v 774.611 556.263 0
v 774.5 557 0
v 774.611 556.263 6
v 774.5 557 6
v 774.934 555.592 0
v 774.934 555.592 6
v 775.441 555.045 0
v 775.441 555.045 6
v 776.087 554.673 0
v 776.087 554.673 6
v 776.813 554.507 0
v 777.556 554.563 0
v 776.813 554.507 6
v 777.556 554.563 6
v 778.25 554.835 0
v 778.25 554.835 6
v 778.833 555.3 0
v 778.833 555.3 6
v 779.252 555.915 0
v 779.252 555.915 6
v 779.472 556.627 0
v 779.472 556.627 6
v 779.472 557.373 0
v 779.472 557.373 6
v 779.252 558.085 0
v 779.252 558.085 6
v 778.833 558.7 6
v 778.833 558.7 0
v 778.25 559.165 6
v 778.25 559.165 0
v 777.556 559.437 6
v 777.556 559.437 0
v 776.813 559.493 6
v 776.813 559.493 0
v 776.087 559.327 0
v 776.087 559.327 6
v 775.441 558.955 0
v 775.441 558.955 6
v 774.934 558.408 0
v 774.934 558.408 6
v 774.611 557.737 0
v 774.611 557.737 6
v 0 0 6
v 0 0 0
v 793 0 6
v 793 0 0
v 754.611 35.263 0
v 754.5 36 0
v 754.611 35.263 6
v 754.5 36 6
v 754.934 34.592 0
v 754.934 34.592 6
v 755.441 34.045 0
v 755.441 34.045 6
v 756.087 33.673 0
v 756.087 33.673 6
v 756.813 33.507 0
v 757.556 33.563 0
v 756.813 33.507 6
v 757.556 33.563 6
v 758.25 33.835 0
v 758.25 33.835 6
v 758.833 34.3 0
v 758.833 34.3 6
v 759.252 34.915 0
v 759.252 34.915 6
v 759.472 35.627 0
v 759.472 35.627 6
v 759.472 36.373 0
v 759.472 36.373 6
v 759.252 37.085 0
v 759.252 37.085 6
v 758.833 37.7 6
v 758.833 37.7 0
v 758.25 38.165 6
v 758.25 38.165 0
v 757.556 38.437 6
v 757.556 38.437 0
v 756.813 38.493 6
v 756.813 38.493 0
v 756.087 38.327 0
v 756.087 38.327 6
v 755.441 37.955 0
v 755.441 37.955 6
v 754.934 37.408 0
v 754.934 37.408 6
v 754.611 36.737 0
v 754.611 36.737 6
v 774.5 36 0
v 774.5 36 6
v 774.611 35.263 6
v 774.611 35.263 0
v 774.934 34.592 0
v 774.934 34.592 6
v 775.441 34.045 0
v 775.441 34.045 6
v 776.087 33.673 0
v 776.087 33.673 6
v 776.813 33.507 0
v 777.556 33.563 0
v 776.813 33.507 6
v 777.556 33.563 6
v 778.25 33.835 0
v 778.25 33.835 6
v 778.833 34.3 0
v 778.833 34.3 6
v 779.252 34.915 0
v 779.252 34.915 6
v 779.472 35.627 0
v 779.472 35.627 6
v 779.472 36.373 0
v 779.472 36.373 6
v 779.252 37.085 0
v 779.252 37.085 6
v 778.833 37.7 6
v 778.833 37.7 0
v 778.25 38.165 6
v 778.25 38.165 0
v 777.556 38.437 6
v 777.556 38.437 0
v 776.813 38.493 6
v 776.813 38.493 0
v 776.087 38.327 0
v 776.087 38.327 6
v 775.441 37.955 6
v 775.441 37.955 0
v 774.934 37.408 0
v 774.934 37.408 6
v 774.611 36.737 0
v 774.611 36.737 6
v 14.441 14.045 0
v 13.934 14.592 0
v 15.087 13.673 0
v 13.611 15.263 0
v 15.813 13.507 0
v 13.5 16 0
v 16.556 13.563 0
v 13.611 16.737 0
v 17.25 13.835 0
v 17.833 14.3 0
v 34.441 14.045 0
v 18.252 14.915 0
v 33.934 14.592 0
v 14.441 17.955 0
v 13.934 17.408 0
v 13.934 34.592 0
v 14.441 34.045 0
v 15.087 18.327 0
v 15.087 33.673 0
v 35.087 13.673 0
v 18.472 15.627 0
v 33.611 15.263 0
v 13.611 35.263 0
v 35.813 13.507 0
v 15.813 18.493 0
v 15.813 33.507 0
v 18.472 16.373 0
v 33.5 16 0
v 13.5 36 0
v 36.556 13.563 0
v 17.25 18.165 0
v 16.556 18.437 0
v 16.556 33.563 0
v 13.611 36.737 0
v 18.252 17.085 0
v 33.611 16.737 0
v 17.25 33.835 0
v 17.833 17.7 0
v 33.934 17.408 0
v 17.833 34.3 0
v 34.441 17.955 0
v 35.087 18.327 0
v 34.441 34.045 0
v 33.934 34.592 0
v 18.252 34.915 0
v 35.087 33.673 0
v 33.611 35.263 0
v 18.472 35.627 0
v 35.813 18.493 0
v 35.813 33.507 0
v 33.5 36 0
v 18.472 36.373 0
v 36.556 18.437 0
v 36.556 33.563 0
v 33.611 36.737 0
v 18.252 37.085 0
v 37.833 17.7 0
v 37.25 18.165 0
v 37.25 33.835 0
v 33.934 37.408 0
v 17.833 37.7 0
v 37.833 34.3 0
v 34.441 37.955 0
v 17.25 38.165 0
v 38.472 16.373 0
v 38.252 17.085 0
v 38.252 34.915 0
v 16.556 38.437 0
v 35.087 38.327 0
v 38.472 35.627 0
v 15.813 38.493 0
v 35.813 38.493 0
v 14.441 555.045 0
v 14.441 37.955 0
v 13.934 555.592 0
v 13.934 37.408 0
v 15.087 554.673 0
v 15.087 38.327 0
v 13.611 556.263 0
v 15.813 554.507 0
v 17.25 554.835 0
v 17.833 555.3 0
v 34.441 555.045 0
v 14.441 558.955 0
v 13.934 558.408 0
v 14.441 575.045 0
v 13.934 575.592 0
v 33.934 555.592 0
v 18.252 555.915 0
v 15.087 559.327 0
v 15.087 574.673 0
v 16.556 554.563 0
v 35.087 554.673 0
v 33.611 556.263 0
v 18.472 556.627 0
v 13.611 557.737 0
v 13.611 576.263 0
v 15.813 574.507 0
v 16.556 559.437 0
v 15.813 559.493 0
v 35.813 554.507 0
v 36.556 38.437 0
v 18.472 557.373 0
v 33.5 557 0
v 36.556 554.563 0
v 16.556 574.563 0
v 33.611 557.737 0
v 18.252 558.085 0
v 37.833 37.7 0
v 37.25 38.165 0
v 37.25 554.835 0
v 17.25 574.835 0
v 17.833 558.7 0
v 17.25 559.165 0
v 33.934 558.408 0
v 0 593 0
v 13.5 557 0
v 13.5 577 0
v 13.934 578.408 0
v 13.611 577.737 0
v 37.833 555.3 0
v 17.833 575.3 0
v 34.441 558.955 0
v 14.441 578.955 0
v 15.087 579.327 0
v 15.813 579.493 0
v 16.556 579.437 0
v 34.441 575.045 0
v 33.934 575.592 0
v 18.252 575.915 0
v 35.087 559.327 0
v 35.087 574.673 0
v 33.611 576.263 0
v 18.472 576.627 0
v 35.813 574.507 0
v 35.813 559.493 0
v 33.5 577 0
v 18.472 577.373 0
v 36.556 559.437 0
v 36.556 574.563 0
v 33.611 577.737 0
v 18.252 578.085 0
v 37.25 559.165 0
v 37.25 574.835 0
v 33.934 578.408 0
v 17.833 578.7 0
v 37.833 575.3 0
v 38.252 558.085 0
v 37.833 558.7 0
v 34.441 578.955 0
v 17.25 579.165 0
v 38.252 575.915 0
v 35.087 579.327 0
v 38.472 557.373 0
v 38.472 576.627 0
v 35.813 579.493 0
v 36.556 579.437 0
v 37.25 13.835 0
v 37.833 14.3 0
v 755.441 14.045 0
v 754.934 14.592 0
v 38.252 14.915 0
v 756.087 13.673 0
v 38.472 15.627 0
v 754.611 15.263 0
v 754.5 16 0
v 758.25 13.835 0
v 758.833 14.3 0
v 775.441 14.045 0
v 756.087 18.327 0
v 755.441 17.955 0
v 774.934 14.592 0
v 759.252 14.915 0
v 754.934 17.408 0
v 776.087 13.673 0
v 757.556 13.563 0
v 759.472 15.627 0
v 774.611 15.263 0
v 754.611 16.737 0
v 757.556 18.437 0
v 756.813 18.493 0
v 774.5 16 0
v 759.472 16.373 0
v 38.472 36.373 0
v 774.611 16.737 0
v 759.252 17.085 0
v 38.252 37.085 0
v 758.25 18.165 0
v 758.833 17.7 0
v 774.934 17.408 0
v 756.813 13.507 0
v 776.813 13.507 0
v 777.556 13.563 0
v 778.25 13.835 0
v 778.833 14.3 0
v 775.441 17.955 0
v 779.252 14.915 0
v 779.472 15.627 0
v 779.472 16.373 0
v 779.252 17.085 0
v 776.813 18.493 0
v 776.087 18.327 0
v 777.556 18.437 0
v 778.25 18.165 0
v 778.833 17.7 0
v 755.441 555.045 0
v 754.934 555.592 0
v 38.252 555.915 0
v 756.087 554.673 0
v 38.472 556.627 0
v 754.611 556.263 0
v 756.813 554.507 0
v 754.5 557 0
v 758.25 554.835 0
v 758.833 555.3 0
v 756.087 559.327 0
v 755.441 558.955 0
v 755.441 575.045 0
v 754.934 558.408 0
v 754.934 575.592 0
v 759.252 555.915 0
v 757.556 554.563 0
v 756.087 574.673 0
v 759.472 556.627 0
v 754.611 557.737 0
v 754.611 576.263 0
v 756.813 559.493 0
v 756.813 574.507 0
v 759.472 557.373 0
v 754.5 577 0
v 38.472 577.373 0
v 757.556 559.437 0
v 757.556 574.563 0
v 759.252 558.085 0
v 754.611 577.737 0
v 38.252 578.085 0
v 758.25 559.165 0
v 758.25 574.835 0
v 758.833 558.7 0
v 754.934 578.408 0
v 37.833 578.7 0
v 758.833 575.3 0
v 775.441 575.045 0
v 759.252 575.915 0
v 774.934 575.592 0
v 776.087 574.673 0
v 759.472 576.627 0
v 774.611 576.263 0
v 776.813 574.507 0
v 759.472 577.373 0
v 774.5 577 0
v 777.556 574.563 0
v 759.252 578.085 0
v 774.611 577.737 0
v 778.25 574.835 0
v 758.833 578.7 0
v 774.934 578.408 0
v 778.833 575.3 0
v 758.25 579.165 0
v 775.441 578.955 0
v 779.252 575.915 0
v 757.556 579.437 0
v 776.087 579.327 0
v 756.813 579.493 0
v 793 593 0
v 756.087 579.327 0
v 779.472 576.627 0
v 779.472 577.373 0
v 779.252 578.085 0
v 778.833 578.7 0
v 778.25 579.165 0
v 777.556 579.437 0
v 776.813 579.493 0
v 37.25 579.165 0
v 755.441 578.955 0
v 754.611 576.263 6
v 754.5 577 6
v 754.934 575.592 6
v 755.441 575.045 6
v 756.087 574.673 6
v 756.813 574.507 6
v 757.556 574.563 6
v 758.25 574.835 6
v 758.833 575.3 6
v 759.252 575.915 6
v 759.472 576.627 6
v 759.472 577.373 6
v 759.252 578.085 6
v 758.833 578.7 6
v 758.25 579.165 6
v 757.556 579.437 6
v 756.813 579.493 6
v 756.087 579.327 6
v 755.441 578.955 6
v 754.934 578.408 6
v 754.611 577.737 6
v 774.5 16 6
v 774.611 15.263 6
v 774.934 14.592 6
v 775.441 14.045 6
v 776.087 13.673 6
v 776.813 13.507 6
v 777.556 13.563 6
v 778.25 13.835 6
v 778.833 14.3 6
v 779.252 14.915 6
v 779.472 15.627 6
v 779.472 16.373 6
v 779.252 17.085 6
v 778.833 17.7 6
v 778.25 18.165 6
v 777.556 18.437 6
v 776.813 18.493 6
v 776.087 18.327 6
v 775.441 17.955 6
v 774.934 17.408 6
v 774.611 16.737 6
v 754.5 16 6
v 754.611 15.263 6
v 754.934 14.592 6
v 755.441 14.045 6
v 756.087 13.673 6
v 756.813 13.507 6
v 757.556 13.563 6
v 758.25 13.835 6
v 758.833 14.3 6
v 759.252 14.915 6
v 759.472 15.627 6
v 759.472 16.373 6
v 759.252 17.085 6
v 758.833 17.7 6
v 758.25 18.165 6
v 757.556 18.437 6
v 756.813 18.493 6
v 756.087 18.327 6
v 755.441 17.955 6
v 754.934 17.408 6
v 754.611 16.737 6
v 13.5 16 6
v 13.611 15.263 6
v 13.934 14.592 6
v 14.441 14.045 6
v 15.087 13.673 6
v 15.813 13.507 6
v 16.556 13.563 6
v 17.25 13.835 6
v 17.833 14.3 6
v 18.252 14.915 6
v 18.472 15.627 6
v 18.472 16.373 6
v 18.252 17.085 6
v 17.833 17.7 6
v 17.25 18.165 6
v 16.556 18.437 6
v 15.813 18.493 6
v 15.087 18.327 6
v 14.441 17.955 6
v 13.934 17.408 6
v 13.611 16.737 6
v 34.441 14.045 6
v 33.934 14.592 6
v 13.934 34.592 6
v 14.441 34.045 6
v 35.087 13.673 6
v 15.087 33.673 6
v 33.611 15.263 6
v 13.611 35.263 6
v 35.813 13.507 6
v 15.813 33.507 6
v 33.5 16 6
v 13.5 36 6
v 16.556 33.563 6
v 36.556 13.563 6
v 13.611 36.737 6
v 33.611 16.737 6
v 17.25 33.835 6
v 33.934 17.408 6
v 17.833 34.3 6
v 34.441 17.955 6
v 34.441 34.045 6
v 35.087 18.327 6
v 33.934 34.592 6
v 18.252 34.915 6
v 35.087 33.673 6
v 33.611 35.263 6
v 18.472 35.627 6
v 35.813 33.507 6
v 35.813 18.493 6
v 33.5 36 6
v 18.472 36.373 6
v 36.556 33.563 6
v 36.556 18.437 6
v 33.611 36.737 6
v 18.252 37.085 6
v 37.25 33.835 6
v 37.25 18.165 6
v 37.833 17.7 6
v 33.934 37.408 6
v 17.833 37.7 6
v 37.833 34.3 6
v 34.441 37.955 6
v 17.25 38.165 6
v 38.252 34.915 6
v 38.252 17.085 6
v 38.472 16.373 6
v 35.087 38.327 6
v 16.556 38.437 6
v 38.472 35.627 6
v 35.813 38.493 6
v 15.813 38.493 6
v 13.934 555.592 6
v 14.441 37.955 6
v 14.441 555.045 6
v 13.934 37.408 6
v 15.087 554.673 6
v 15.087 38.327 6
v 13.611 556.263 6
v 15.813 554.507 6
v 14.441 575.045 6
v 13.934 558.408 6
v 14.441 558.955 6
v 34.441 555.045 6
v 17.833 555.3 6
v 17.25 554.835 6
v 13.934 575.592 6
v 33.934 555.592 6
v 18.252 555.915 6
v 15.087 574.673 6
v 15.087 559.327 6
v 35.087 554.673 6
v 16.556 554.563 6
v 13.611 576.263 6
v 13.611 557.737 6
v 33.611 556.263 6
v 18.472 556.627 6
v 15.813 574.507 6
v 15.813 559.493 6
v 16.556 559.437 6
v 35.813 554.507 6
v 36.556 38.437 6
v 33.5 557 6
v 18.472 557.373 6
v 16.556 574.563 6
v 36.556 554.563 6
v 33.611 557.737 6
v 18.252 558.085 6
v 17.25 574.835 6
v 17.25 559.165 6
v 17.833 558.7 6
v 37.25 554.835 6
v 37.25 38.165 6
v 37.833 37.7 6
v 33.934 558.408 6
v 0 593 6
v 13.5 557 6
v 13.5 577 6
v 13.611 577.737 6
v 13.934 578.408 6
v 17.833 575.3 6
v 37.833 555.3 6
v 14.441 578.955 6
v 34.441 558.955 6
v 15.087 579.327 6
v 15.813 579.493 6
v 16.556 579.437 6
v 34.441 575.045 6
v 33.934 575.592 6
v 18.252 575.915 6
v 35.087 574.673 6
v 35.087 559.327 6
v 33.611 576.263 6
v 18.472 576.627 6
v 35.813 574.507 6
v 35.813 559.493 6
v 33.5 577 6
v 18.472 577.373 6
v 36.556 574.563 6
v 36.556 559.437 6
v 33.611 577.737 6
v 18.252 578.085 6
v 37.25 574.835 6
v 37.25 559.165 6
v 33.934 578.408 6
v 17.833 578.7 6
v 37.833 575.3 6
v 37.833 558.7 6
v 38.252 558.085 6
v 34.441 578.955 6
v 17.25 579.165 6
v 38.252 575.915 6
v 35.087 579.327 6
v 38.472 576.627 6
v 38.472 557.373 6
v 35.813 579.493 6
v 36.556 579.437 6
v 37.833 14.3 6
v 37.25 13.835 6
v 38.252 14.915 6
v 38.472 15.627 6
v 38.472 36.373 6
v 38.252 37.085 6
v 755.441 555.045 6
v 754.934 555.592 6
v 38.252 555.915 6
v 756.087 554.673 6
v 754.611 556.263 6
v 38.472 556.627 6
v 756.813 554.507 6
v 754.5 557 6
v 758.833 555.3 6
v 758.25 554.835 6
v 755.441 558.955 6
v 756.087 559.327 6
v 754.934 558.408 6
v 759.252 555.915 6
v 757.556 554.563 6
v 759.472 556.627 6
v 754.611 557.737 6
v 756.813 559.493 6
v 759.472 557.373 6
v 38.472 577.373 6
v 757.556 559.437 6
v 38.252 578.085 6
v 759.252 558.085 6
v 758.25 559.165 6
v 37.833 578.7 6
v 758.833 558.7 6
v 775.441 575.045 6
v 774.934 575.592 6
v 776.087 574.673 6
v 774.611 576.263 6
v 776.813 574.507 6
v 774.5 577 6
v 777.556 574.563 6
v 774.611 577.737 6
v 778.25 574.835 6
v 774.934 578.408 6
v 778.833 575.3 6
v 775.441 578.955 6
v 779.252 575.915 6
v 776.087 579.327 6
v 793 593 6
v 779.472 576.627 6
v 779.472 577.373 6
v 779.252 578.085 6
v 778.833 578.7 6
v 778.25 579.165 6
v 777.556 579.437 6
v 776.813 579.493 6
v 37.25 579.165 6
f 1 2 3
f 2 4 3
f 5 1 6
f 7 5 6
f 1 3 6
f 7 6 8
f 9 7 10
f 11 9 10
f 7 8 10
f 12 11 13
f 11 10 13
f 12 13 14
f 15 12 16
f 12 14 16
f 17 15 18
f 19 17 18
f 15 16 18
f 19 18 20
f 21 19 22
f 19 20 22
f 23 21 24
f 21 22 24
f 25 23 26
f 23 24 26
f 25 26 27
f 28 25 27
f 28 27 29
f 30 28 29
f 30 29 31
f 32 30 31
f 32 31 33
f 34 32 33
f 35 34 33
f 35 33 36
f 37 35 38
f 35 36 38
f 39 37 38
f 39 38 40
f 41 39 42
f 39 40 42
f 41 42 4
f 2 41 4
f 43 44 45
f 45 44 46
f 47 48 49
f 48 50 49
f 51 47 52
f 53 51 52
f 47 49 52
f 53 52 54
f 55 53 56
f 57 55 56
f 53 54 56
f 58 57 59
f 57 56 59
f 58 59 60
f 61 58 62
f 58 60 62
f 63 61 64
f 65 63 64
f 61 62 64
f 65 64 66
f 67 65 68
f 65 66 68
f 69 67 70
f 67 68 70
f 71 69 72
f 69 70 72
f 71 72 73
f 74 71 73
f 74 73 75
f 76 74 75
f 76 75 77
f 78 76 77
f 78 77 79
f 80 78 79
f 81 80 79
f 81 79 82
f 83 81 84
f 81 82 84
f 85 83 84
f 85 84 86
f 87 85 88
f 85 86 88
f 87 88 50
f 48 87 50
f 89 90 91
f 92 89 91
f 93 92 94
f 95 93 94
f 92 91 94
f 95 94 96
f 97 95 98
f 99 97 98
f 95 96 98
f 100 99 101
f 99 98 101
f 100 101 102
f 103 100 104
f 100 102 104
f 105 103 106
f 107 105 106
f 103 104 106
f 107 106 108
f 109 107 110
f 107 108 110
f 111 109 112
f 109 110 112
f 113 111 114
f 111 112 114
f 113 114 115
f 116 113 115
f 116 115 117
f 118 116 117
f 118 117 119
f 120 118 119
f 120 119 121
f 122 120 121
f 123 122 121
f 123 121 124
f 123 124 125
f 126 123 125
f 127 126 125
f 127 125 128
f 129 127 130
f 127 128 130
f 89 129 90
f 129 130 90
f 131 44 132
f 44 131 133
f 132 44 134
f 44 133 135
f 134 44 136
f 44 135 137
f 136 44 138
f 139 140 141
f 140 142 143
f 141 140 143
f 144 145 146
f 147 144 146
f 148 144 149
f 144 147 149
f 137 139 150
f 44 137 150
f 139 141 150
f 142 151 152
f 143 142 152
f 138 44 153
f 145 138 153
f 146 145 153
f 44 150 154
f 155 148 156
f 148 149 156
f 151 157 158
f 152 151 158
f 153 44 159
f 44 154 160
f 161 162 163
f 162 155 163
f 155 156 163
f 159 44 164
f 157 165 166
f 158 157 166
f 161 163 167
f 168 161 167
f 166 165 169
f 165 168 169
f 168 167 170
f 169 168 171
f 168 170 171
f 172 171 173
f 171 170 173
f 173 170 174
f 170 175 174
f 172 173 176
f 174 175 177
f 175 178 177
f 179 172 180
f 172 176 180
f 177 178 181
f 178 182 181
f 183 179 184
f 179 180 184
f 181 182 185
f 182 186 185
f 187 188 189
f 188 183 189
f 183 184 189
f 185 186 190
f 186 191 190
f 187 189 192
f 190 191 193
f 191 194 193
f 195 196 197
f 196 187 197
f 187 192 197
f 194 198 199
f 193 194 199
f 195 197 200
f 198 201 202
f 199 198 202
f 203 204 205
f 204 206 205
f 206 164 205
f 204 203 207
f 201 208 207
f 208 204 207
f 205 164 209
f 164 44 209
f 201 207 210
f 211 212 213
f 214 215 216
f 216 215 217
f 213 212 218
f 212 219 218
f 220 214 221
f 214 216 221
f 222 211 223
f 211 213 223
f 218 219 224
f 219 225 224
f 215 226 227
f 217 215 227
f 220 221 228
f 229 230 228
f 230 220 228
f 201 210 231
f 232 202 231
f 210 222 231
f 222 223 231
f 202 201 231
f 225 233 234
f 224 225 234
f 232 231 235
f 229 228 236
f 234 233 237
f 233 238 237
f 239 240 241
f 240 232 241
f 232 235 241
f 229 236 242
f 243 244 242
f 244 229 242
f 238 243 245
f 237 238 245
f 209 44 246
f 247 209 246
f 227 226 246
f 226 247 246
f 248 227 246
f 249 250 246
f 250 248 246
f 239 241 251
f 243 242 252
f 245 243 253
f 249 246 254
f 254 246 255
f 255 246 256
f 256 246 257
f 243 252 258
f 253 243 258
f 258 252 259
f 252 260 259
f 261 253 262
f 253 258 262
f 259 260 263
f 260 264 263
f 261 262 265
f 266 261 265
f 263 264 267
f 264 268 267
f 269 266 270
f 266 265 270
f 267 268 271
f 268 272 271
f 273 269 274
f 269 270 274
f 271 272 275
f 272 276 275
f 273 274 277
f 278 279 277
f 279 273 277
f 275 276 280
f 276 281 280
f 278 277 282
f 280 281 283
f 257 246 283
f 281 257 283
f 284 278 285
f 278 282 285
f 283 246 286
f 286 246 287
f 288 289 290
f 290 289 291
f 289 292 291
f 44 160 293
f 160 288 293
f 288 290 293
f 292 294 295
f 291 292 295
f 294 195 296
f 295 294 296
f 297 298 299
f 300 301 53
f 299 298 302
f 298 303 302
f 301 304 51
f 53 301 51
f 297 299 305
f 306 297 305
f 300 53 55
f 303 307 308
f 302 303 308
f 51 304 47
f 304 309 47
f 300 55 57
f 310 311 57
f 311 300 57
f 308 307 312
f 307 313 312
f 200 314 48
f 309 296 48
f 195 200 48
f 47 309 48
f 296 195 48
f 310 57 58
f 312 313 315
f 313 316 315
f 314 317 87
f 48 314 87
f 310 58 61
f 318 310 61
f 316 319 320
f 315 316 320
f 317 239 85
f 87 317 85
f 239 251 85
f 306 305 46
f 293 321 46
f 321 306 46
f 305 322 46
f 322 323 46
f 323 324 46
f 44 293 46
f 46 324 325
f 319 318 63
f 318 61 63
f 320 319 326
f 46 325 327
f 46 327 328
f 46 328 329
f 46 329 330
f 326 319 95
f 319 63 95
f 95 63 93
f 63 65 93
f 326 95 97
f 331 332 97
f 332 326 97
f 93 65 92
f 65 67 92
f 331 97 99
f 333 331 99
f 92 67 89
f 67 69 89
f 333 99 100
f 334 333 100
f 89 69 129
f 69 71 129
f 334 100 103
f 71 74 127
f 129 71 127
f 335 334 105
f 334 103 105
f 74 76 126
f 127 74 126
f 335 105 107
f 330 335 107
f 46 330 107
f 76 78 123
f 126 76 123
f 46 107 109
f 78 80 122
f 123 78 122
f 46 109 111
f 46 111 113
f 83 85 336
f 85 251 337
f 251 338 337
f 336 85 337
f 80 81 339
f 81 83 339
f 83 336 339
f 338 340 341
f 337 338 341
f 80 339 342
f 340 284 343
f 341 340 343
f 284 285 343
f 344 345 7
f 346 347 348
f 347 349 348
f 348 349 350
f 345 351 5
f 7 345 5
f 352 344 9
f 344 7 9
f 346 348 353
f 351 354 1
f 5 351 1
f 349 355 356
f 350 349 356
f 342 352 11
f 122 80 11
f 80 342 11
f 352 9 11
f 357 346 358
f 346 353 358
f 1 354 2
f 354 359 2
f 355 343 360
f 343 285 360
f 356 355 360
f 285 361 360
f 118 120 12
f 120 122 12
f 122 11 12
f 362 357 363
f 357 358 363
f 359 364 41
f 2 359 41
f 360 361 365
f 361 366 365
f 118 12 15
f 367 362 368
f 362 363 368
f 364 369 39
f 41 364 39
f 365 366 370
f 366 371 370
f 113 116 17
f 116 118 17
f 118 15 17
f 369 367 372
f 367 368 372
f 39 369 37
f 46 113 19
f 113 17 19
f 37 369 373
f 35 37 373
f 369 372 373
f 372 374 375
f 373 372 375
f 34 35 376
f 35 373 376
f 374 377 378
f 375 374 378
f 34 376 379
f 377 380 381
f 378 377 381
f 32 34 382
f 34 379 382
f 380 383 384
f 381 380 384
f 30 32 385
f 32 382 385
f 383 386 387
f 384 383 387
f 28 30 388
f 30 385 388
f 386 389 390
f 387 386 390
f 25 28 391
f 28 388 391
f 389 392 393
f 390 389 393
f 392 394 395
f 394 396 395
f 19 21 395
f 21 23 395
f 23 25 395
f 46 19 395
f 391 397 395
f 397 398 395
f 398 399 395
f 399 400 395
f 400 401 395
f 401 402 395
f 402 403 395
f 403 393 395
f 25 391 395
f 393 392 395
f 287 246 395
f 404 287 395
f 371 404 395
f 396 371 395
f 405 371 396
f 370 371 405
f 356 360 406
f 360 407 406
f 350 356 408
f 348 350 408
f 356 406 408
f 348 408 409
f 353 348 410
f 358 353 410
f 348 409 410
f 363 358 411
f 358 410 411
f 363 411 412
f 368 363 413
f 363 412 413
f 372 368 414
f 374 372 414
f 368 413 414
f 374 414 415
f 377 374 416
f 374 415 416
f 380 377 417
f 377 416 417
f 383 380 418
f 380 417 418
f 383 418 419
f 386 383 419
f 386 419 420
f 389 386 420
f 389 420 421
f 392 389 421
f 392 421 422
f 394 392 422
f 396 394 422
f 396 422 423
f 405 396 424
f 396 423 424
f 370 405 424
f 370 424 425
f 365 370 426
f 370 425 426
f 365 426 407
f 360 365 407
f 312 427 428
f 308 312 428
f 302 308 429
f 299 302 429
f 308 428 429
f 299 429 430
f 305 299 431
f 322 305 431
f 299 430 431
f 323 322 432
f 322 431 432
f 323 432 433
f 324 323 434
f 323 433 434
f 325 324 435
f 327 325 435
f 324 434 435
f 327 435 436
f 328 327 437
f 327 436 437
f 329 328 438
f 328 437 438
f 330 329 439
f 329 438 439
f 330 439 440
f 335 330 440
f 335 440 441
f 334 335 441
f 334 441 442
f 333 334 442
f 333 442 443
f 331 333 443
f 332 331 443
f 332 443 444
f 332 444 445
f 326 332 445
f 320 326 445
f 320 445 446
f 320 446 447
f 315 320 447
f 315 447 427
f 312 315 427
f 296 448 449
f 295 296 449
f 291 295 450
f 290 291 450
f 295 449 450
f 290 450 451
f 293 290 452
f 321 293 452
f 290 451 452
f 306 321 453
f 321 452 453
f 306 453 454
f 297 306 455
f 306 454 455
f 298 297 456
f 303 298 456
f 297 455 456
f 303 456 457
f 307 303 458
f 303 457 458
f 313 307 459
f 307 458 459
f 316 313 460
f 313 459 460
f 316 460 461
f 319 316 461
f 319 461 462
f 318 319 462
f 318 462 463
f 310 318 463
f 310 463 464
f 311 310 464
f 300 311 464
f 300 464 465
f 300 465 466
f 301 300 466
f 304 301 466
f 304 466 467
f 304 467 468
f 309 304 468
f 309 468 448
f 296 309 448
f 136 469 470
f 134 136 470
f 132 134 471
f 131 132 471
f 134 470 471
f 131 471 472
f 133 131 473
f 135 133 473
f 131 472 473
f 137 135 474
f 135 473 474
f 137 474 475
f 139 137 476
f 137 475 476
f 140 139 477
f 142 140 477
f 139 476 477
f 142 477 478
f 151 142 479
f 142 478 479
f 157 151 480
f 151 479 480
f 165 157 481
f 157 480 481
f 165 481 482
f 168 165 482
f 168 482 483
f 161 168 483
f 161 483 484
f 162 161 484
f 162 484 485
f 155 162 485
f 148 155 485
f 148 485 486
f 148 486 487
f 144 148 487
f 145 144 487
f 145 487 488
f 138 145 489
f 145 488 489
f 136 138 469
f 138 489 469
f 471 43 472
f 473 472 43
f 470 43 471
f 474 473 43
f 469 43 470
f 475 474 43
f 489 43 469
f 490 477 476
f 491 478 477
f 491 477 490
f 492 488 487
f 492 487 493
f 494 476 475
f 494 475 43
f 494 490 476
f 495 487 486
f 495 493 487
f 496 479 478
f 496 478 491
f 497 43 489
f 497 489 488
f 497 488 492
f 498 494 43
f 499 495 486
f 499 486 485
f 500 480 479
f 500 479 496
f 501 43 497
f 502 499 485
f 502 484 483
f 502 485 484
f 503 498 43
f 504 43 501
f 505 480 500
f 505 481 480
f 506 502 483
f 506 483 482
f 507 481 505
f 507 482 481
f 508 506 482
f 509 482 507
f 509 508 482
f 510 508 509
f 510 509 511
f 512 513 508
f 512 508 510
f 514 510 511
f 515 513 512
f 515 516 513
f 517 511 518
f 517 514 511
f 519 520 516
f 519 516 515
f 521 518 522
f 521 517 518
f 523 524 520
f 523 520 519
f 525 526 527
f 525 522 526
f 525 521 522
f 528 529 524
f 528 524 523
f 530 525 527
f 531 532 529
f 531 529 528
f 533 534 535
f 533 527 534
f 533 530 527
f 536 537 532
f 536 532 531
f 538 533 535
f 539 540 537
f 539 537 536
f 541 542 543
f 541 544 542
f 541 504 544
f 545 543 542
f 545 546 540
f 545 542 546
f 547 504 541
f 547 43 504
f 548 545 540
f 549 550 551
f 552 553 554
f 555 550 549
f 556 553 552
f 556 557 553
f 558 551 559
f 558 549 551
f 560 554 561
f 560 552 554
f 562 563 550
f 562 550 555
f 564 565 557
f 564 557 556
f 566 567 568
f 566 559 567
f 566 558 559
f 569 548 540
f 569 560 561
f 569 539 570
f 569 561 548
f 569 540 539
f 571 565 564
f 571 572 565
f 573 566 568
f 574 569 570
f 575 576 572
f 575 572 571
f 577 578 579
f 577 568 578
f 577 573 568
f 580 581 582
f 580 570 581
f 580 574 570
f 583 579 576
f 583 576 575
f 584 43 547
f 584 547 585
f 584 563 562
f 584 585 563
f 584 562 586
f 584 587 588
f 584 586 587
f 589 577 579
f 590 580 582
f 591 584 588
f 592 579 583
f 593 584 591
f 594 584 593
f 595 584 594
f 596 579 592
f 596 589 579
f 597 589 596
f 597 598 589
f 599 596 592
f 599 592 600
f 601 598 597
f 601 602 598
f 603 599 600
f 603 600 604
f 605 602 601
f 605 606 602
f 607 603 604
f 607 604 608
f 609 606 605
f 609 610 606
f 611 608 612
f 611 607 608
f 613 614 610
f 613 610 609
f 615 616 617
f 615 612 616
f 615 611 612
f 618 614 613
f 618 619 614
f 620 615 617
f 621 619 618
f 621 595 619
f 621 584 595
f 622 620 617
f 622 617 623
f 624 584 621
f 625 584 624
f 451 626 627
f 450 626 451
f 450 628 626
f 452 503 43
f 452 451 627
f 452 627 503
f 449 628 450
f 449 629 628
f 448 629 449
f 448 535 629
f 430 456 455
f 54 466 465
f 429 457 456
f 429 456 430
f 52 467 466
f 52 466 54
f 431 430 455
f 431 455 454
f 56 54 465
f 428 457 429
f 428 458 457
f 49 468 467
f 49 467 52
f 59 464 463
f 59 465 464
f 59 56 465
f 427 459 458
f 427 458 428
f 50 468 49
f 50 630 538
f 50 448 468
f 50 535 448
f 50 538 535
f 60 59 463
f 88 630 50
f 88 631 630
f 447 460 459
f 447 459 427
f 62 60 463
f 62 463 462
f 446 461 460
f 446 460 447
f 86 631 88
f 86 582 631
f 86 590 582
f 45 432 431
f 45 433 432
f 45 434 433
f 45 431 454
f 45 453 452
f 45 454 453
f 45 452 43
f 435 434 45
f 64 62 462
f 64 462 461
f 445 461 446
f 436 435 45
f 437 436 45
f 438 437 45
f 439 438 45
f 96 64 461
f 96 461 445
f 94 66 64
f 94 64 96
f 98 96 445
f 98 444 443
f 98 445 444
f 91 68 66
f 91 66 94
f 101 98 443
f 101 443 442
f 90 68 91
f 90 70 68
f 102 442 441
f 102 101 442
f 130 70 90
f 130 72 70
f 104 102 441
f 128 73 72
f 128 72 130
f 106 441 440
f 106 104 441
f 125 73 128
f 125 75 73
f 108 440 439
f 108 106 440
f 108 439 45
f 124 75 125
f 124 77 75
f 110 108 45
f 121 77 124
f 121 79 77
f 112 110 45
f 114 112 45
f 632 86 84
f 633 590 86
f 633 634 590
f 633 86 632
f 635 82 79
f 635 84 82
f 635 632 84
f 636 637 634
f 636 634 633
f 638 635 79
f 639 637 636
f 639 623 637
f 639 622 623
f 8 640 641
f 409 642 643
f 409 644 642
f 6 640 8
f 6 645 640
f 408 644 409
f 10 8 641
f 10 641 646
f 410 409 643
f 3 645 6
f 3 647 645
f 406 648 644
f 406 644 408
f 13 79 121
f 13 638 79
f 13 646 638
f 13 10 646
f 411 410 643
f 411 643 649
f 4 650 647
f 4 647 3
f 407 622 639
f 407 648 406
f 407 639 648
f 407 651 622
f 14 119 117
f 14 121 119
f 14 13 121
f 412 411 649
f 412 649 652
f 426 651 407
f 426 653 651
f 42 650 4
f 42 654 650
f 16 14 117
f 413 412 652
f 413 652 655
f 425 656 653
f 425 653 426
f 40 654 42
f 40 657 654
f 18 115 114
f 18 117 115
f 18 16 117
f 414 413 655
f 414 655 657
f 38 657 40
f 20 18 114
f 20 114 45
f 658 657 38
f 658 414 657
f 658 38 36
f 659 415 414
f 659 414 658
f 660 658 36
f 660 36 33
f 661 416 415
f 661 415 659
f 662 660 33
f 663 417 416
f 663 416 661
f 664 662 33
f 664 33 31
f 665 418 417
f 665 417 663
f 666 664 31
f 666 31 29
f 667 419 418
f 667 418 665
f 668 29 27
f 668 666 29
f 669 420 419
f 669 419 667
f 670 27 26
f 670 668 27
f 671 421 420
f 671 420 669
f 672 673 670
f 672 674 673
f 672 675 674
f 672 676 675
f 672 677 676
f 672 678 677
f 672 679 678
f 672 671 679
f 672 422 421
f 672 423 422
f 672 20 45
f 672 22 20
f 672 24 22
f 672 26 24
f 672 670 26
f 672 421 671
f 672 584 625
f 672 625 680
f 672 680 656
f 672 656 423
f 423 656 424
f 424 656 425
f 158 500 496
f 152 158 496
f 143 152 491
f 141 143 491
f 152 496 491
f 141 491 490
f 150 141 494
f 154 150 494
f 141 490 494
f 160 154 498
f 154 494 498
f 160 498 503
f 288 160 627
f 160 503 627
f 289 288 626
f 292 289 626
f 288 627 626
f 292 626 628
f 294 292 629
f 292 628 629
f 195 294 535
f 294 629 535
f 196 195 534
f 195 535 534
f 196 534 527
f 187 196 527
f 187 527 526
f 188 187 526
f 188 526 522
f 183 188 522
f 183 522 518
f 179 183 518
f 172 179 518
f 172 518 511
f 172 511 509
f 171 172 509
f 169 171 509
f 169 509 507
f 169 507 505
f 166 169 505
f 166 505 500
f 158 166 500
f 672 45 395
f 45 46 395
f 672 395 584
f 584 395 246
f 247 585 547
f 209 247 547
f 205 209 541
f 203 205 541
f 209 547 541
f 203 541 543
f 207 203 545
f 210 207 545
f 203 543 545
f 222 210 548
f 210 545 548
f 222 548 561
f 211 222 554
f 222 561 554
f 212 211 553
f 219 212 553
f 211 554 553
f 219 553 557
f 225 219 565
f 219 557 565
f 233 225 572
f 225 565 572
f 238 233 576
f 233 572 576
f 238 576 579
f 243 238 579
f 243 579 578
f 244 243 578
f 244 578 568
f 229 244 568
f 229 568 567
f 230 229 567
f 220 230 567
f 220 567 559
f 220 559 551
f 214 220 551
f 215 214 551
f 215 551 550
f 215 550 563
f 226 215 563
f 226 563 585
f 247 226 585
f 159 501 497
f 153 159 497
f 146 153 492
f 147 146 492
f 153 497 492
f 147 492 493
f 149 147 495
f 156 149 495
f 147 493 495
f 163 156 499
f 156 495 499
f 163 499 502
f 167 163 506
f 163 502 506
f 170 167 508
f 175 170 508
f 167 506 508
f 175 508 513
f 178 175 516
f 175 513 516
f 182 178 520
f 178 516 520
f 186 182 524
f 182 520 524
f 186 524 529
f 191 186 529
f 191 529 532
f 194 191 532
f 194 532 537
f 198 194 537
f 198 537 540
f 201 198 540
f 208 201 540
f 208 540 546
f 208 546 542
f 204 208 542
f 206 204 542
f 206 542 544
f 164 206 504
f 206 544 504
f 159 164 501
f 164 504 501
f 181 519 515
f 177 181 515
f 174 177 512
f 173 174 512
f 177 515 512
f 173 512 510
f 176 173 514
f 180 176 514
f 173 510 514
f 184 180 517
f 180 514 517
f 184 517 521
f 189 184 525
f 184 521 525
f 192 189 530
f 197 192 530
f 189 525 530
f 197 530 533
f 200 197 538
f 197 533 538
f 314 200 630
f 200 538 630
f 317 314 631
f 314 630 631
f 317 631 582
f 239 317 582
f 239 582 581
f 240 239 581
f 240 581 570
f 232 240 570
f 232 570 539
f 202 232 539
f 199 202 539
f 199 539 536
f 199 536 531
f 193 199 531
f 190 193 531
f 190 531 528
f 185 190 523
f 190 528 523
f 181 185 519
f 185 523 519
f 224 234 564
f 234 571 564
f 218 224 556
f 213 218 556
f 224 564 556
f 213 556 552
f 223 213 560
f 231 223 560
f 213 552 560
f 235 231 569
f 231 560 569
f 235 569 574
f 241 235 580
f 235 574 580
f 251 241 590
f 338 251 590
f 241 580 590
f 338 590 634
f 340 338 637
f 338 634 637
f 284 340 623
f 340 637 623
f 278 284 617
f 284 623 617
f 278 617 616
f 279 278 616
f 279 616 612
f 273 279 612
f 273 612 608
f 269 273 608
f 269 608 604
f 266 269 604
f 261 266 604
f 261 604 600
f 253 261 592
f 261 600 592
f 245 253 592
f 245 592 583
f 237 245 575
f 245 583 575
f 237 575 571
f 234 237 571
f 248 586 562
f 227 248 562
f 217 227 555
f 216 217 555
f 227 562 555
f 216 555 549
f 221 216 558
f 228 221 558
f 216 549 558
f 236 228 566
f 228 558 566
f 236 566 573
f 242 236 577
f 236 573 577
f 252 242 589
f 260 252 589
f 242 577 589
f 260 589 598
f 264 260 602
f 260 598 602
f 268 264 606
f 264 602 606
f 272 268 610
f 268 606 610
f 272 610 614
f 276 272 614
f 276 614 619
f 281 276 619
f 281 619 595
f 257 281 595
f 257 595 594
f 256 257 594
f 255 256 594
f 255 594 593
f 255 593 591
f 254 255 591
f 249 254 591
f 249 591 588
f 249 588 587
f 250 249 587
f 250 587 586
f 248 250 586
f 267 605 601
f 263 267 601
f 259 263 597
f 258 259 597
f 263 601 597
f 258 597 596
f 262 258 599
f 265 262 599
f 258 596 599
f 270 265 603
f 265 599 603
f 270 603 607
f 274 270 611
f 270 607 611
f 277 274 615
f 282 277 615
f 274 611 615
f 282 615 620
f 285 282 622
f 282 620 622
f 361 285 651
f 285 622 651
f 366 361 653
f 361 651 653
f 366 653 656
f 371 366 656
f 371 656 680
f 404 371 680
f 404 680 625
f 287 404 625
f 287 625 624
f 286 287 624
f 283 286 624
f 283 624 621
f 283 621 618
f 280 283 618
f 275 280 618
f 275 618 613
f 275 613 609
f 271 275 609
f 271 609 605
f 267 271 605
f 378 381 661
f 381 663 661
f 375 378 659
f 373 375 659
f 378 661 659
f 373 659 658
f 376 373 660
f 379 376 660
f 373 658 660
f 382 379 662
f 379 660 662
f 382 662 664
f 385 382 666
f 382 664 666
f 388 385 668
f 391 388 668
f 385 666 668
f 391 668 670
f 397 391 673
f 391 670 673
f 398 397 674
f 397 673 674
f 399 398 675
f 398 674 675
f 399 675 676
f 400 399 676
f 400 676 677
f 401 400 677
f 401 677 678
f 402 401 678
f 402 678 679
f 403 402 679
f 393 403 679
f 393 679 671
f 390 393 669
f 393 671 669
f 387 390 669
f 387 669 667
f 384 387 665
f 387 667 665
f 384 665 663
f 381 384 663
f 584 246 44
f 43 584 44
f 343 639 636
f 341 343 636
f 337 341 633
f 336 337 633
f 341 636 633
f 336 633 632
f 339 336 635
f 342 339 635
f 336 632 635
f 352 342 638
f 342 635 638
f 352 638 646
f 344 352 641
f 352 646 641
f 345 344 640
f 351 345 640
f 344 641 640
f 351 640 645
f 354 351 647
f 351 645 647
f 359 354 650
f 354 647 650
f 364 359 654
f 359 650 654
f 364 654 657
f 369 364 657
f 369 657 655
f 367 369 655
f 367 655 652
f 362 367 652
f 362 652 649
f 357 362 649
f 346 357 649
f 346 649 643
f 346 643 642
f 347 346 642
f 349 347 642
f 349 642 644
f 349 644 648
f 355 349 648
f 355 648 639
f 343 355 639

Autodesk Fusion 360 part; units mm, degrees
sketch "Sketch1" plane through (0, 0, 0) normal (0, 0, 1) x (1, 0, 0)
  line L0 (0, 0) -> (793, 0)
  line L1 (793, 0) -> (793, 593)
  line L2 (793, 593) -> (0, 593)
  line L3 (0, 593) -> (0, 0)
  dimension "d1" = 793
  dimension "d2" = 593
extrude "Extrude1" add sketch "Sketch1" along normal blind 6
sketch "Sketch2" plane through (0, 0, 6) normal (0, 0, 1) x (-1, 0, 0)
  line L0 (0, -593) -> (0, 0)
  line L1 (0, 0) -> (-793, 0)
  line L2 (-793, 0) -> (-793, -593)
  line L3 (-793, -593) -> (0, -593)
  line L4 (0, 0) -> (-6, 0)
  line L5 (-6, 0) -> (-6, -6)
  line L6 (-6, -6) -> (0, -6)
  line L7 (0, -6) -> (0, 0)
  line L8 (-793, -593) -> (-787, -593)
  line L9 (-787, -593) -> (-787, -587)
  line L10 (-787, -587) -> (-793, -587)
  line L11 (-793, -587) -> (-793, -593)
  line L12 (-787, -587) -> (-6, -587)
  line L13 (-6, -587) -> (-6, -6)
  line L14 (-6, -6) -> (-787, -6)
  line L15 (-787, -6) -> (-787, -587)
  line L16 (-6, -6) -> (-36, -6)
  line L17 (-6, -36) -> (-6, -6)
  line L18 (-6, -6) -> (-16, -6)
  line L19 (-6, -16) -> (-6, -6)
  circle A0 centre (-16, -16) radius 2.5
  circle A1 centre (-36, -36) radius 2.5
  circle A2 centre (-16, -36) radius 2.5
  circle A3 centre (-36, -16) radius 2.5
  dimension "d5" = 6
  dimension "d6" = 6
  dimension "d7" = 6
  dimension "d8" = 6
  dimension "d9" = 30
  dimension "d10" = 30
  dimension "d11" = 10
  dimension "d12" = 10
  dimension "d13" = 5
  dimension "d14" = 5
  dimension "d15" = 5
  dimension "d16" = 5
extrude "Extrude2" cut sketch "Sketch2" against normal blind 6 contours A0 | A1 | A2 | A3
pattern_linear "R-Pattern1" count 1 spacing 0 along (0, 0, 1) count 2 spacing 741 along (1, 0, 0) of "Extrude2"
pattern_linear "R-Pattern2" count 1 spacing 0 along (1, 0, 0) count 2 spacing 541 along (0, 1, 0) of "Extrude2", "R-Pattern1"
sketch "Sketch4" plane through (0, 0, 6) normal (0, 0, 1) x (-1, 0, 0)
  circle A0 centre (-777, -577) radius 2.5
  circle A1 centre (-777, -557) radius 2.5
  circle A2 centre (-757, -577) radius 2.5
  circle A3 centre (-757, -557) radius 2.5
  circle A4 centre (-36, -577) radius 2.5
  circle A5 centre (-36, -557) radius 2.5
  circle A6 centre (-16, -577) radius 2.5
  circle A7 centre (-16, -557) radius 2.5
  circle A8 centre (-777, -36) radius 2.5
  circle A9 centre (-777, -16) radius 2.5
  circle A10 centre (-757, -36) radius 2.5
  circle A11 centre (-757, -16) radius 2.5
  circle A12 centre (-36, -36) radius 2.5
  circle A13 centre (-36, -16) radius 2.5
  circle A14 centre (-16, -36) radius 2.5
  circle A15 centre (-16, -16) radius 2.5
  line L0 (0, -593) -> (0, 0)
  line L1 (0, 0) -> (-793, 0)
  line L2 (-793, 0) -> (-793, -593)
  line L3 (-793, -593) -> (0, -593)
